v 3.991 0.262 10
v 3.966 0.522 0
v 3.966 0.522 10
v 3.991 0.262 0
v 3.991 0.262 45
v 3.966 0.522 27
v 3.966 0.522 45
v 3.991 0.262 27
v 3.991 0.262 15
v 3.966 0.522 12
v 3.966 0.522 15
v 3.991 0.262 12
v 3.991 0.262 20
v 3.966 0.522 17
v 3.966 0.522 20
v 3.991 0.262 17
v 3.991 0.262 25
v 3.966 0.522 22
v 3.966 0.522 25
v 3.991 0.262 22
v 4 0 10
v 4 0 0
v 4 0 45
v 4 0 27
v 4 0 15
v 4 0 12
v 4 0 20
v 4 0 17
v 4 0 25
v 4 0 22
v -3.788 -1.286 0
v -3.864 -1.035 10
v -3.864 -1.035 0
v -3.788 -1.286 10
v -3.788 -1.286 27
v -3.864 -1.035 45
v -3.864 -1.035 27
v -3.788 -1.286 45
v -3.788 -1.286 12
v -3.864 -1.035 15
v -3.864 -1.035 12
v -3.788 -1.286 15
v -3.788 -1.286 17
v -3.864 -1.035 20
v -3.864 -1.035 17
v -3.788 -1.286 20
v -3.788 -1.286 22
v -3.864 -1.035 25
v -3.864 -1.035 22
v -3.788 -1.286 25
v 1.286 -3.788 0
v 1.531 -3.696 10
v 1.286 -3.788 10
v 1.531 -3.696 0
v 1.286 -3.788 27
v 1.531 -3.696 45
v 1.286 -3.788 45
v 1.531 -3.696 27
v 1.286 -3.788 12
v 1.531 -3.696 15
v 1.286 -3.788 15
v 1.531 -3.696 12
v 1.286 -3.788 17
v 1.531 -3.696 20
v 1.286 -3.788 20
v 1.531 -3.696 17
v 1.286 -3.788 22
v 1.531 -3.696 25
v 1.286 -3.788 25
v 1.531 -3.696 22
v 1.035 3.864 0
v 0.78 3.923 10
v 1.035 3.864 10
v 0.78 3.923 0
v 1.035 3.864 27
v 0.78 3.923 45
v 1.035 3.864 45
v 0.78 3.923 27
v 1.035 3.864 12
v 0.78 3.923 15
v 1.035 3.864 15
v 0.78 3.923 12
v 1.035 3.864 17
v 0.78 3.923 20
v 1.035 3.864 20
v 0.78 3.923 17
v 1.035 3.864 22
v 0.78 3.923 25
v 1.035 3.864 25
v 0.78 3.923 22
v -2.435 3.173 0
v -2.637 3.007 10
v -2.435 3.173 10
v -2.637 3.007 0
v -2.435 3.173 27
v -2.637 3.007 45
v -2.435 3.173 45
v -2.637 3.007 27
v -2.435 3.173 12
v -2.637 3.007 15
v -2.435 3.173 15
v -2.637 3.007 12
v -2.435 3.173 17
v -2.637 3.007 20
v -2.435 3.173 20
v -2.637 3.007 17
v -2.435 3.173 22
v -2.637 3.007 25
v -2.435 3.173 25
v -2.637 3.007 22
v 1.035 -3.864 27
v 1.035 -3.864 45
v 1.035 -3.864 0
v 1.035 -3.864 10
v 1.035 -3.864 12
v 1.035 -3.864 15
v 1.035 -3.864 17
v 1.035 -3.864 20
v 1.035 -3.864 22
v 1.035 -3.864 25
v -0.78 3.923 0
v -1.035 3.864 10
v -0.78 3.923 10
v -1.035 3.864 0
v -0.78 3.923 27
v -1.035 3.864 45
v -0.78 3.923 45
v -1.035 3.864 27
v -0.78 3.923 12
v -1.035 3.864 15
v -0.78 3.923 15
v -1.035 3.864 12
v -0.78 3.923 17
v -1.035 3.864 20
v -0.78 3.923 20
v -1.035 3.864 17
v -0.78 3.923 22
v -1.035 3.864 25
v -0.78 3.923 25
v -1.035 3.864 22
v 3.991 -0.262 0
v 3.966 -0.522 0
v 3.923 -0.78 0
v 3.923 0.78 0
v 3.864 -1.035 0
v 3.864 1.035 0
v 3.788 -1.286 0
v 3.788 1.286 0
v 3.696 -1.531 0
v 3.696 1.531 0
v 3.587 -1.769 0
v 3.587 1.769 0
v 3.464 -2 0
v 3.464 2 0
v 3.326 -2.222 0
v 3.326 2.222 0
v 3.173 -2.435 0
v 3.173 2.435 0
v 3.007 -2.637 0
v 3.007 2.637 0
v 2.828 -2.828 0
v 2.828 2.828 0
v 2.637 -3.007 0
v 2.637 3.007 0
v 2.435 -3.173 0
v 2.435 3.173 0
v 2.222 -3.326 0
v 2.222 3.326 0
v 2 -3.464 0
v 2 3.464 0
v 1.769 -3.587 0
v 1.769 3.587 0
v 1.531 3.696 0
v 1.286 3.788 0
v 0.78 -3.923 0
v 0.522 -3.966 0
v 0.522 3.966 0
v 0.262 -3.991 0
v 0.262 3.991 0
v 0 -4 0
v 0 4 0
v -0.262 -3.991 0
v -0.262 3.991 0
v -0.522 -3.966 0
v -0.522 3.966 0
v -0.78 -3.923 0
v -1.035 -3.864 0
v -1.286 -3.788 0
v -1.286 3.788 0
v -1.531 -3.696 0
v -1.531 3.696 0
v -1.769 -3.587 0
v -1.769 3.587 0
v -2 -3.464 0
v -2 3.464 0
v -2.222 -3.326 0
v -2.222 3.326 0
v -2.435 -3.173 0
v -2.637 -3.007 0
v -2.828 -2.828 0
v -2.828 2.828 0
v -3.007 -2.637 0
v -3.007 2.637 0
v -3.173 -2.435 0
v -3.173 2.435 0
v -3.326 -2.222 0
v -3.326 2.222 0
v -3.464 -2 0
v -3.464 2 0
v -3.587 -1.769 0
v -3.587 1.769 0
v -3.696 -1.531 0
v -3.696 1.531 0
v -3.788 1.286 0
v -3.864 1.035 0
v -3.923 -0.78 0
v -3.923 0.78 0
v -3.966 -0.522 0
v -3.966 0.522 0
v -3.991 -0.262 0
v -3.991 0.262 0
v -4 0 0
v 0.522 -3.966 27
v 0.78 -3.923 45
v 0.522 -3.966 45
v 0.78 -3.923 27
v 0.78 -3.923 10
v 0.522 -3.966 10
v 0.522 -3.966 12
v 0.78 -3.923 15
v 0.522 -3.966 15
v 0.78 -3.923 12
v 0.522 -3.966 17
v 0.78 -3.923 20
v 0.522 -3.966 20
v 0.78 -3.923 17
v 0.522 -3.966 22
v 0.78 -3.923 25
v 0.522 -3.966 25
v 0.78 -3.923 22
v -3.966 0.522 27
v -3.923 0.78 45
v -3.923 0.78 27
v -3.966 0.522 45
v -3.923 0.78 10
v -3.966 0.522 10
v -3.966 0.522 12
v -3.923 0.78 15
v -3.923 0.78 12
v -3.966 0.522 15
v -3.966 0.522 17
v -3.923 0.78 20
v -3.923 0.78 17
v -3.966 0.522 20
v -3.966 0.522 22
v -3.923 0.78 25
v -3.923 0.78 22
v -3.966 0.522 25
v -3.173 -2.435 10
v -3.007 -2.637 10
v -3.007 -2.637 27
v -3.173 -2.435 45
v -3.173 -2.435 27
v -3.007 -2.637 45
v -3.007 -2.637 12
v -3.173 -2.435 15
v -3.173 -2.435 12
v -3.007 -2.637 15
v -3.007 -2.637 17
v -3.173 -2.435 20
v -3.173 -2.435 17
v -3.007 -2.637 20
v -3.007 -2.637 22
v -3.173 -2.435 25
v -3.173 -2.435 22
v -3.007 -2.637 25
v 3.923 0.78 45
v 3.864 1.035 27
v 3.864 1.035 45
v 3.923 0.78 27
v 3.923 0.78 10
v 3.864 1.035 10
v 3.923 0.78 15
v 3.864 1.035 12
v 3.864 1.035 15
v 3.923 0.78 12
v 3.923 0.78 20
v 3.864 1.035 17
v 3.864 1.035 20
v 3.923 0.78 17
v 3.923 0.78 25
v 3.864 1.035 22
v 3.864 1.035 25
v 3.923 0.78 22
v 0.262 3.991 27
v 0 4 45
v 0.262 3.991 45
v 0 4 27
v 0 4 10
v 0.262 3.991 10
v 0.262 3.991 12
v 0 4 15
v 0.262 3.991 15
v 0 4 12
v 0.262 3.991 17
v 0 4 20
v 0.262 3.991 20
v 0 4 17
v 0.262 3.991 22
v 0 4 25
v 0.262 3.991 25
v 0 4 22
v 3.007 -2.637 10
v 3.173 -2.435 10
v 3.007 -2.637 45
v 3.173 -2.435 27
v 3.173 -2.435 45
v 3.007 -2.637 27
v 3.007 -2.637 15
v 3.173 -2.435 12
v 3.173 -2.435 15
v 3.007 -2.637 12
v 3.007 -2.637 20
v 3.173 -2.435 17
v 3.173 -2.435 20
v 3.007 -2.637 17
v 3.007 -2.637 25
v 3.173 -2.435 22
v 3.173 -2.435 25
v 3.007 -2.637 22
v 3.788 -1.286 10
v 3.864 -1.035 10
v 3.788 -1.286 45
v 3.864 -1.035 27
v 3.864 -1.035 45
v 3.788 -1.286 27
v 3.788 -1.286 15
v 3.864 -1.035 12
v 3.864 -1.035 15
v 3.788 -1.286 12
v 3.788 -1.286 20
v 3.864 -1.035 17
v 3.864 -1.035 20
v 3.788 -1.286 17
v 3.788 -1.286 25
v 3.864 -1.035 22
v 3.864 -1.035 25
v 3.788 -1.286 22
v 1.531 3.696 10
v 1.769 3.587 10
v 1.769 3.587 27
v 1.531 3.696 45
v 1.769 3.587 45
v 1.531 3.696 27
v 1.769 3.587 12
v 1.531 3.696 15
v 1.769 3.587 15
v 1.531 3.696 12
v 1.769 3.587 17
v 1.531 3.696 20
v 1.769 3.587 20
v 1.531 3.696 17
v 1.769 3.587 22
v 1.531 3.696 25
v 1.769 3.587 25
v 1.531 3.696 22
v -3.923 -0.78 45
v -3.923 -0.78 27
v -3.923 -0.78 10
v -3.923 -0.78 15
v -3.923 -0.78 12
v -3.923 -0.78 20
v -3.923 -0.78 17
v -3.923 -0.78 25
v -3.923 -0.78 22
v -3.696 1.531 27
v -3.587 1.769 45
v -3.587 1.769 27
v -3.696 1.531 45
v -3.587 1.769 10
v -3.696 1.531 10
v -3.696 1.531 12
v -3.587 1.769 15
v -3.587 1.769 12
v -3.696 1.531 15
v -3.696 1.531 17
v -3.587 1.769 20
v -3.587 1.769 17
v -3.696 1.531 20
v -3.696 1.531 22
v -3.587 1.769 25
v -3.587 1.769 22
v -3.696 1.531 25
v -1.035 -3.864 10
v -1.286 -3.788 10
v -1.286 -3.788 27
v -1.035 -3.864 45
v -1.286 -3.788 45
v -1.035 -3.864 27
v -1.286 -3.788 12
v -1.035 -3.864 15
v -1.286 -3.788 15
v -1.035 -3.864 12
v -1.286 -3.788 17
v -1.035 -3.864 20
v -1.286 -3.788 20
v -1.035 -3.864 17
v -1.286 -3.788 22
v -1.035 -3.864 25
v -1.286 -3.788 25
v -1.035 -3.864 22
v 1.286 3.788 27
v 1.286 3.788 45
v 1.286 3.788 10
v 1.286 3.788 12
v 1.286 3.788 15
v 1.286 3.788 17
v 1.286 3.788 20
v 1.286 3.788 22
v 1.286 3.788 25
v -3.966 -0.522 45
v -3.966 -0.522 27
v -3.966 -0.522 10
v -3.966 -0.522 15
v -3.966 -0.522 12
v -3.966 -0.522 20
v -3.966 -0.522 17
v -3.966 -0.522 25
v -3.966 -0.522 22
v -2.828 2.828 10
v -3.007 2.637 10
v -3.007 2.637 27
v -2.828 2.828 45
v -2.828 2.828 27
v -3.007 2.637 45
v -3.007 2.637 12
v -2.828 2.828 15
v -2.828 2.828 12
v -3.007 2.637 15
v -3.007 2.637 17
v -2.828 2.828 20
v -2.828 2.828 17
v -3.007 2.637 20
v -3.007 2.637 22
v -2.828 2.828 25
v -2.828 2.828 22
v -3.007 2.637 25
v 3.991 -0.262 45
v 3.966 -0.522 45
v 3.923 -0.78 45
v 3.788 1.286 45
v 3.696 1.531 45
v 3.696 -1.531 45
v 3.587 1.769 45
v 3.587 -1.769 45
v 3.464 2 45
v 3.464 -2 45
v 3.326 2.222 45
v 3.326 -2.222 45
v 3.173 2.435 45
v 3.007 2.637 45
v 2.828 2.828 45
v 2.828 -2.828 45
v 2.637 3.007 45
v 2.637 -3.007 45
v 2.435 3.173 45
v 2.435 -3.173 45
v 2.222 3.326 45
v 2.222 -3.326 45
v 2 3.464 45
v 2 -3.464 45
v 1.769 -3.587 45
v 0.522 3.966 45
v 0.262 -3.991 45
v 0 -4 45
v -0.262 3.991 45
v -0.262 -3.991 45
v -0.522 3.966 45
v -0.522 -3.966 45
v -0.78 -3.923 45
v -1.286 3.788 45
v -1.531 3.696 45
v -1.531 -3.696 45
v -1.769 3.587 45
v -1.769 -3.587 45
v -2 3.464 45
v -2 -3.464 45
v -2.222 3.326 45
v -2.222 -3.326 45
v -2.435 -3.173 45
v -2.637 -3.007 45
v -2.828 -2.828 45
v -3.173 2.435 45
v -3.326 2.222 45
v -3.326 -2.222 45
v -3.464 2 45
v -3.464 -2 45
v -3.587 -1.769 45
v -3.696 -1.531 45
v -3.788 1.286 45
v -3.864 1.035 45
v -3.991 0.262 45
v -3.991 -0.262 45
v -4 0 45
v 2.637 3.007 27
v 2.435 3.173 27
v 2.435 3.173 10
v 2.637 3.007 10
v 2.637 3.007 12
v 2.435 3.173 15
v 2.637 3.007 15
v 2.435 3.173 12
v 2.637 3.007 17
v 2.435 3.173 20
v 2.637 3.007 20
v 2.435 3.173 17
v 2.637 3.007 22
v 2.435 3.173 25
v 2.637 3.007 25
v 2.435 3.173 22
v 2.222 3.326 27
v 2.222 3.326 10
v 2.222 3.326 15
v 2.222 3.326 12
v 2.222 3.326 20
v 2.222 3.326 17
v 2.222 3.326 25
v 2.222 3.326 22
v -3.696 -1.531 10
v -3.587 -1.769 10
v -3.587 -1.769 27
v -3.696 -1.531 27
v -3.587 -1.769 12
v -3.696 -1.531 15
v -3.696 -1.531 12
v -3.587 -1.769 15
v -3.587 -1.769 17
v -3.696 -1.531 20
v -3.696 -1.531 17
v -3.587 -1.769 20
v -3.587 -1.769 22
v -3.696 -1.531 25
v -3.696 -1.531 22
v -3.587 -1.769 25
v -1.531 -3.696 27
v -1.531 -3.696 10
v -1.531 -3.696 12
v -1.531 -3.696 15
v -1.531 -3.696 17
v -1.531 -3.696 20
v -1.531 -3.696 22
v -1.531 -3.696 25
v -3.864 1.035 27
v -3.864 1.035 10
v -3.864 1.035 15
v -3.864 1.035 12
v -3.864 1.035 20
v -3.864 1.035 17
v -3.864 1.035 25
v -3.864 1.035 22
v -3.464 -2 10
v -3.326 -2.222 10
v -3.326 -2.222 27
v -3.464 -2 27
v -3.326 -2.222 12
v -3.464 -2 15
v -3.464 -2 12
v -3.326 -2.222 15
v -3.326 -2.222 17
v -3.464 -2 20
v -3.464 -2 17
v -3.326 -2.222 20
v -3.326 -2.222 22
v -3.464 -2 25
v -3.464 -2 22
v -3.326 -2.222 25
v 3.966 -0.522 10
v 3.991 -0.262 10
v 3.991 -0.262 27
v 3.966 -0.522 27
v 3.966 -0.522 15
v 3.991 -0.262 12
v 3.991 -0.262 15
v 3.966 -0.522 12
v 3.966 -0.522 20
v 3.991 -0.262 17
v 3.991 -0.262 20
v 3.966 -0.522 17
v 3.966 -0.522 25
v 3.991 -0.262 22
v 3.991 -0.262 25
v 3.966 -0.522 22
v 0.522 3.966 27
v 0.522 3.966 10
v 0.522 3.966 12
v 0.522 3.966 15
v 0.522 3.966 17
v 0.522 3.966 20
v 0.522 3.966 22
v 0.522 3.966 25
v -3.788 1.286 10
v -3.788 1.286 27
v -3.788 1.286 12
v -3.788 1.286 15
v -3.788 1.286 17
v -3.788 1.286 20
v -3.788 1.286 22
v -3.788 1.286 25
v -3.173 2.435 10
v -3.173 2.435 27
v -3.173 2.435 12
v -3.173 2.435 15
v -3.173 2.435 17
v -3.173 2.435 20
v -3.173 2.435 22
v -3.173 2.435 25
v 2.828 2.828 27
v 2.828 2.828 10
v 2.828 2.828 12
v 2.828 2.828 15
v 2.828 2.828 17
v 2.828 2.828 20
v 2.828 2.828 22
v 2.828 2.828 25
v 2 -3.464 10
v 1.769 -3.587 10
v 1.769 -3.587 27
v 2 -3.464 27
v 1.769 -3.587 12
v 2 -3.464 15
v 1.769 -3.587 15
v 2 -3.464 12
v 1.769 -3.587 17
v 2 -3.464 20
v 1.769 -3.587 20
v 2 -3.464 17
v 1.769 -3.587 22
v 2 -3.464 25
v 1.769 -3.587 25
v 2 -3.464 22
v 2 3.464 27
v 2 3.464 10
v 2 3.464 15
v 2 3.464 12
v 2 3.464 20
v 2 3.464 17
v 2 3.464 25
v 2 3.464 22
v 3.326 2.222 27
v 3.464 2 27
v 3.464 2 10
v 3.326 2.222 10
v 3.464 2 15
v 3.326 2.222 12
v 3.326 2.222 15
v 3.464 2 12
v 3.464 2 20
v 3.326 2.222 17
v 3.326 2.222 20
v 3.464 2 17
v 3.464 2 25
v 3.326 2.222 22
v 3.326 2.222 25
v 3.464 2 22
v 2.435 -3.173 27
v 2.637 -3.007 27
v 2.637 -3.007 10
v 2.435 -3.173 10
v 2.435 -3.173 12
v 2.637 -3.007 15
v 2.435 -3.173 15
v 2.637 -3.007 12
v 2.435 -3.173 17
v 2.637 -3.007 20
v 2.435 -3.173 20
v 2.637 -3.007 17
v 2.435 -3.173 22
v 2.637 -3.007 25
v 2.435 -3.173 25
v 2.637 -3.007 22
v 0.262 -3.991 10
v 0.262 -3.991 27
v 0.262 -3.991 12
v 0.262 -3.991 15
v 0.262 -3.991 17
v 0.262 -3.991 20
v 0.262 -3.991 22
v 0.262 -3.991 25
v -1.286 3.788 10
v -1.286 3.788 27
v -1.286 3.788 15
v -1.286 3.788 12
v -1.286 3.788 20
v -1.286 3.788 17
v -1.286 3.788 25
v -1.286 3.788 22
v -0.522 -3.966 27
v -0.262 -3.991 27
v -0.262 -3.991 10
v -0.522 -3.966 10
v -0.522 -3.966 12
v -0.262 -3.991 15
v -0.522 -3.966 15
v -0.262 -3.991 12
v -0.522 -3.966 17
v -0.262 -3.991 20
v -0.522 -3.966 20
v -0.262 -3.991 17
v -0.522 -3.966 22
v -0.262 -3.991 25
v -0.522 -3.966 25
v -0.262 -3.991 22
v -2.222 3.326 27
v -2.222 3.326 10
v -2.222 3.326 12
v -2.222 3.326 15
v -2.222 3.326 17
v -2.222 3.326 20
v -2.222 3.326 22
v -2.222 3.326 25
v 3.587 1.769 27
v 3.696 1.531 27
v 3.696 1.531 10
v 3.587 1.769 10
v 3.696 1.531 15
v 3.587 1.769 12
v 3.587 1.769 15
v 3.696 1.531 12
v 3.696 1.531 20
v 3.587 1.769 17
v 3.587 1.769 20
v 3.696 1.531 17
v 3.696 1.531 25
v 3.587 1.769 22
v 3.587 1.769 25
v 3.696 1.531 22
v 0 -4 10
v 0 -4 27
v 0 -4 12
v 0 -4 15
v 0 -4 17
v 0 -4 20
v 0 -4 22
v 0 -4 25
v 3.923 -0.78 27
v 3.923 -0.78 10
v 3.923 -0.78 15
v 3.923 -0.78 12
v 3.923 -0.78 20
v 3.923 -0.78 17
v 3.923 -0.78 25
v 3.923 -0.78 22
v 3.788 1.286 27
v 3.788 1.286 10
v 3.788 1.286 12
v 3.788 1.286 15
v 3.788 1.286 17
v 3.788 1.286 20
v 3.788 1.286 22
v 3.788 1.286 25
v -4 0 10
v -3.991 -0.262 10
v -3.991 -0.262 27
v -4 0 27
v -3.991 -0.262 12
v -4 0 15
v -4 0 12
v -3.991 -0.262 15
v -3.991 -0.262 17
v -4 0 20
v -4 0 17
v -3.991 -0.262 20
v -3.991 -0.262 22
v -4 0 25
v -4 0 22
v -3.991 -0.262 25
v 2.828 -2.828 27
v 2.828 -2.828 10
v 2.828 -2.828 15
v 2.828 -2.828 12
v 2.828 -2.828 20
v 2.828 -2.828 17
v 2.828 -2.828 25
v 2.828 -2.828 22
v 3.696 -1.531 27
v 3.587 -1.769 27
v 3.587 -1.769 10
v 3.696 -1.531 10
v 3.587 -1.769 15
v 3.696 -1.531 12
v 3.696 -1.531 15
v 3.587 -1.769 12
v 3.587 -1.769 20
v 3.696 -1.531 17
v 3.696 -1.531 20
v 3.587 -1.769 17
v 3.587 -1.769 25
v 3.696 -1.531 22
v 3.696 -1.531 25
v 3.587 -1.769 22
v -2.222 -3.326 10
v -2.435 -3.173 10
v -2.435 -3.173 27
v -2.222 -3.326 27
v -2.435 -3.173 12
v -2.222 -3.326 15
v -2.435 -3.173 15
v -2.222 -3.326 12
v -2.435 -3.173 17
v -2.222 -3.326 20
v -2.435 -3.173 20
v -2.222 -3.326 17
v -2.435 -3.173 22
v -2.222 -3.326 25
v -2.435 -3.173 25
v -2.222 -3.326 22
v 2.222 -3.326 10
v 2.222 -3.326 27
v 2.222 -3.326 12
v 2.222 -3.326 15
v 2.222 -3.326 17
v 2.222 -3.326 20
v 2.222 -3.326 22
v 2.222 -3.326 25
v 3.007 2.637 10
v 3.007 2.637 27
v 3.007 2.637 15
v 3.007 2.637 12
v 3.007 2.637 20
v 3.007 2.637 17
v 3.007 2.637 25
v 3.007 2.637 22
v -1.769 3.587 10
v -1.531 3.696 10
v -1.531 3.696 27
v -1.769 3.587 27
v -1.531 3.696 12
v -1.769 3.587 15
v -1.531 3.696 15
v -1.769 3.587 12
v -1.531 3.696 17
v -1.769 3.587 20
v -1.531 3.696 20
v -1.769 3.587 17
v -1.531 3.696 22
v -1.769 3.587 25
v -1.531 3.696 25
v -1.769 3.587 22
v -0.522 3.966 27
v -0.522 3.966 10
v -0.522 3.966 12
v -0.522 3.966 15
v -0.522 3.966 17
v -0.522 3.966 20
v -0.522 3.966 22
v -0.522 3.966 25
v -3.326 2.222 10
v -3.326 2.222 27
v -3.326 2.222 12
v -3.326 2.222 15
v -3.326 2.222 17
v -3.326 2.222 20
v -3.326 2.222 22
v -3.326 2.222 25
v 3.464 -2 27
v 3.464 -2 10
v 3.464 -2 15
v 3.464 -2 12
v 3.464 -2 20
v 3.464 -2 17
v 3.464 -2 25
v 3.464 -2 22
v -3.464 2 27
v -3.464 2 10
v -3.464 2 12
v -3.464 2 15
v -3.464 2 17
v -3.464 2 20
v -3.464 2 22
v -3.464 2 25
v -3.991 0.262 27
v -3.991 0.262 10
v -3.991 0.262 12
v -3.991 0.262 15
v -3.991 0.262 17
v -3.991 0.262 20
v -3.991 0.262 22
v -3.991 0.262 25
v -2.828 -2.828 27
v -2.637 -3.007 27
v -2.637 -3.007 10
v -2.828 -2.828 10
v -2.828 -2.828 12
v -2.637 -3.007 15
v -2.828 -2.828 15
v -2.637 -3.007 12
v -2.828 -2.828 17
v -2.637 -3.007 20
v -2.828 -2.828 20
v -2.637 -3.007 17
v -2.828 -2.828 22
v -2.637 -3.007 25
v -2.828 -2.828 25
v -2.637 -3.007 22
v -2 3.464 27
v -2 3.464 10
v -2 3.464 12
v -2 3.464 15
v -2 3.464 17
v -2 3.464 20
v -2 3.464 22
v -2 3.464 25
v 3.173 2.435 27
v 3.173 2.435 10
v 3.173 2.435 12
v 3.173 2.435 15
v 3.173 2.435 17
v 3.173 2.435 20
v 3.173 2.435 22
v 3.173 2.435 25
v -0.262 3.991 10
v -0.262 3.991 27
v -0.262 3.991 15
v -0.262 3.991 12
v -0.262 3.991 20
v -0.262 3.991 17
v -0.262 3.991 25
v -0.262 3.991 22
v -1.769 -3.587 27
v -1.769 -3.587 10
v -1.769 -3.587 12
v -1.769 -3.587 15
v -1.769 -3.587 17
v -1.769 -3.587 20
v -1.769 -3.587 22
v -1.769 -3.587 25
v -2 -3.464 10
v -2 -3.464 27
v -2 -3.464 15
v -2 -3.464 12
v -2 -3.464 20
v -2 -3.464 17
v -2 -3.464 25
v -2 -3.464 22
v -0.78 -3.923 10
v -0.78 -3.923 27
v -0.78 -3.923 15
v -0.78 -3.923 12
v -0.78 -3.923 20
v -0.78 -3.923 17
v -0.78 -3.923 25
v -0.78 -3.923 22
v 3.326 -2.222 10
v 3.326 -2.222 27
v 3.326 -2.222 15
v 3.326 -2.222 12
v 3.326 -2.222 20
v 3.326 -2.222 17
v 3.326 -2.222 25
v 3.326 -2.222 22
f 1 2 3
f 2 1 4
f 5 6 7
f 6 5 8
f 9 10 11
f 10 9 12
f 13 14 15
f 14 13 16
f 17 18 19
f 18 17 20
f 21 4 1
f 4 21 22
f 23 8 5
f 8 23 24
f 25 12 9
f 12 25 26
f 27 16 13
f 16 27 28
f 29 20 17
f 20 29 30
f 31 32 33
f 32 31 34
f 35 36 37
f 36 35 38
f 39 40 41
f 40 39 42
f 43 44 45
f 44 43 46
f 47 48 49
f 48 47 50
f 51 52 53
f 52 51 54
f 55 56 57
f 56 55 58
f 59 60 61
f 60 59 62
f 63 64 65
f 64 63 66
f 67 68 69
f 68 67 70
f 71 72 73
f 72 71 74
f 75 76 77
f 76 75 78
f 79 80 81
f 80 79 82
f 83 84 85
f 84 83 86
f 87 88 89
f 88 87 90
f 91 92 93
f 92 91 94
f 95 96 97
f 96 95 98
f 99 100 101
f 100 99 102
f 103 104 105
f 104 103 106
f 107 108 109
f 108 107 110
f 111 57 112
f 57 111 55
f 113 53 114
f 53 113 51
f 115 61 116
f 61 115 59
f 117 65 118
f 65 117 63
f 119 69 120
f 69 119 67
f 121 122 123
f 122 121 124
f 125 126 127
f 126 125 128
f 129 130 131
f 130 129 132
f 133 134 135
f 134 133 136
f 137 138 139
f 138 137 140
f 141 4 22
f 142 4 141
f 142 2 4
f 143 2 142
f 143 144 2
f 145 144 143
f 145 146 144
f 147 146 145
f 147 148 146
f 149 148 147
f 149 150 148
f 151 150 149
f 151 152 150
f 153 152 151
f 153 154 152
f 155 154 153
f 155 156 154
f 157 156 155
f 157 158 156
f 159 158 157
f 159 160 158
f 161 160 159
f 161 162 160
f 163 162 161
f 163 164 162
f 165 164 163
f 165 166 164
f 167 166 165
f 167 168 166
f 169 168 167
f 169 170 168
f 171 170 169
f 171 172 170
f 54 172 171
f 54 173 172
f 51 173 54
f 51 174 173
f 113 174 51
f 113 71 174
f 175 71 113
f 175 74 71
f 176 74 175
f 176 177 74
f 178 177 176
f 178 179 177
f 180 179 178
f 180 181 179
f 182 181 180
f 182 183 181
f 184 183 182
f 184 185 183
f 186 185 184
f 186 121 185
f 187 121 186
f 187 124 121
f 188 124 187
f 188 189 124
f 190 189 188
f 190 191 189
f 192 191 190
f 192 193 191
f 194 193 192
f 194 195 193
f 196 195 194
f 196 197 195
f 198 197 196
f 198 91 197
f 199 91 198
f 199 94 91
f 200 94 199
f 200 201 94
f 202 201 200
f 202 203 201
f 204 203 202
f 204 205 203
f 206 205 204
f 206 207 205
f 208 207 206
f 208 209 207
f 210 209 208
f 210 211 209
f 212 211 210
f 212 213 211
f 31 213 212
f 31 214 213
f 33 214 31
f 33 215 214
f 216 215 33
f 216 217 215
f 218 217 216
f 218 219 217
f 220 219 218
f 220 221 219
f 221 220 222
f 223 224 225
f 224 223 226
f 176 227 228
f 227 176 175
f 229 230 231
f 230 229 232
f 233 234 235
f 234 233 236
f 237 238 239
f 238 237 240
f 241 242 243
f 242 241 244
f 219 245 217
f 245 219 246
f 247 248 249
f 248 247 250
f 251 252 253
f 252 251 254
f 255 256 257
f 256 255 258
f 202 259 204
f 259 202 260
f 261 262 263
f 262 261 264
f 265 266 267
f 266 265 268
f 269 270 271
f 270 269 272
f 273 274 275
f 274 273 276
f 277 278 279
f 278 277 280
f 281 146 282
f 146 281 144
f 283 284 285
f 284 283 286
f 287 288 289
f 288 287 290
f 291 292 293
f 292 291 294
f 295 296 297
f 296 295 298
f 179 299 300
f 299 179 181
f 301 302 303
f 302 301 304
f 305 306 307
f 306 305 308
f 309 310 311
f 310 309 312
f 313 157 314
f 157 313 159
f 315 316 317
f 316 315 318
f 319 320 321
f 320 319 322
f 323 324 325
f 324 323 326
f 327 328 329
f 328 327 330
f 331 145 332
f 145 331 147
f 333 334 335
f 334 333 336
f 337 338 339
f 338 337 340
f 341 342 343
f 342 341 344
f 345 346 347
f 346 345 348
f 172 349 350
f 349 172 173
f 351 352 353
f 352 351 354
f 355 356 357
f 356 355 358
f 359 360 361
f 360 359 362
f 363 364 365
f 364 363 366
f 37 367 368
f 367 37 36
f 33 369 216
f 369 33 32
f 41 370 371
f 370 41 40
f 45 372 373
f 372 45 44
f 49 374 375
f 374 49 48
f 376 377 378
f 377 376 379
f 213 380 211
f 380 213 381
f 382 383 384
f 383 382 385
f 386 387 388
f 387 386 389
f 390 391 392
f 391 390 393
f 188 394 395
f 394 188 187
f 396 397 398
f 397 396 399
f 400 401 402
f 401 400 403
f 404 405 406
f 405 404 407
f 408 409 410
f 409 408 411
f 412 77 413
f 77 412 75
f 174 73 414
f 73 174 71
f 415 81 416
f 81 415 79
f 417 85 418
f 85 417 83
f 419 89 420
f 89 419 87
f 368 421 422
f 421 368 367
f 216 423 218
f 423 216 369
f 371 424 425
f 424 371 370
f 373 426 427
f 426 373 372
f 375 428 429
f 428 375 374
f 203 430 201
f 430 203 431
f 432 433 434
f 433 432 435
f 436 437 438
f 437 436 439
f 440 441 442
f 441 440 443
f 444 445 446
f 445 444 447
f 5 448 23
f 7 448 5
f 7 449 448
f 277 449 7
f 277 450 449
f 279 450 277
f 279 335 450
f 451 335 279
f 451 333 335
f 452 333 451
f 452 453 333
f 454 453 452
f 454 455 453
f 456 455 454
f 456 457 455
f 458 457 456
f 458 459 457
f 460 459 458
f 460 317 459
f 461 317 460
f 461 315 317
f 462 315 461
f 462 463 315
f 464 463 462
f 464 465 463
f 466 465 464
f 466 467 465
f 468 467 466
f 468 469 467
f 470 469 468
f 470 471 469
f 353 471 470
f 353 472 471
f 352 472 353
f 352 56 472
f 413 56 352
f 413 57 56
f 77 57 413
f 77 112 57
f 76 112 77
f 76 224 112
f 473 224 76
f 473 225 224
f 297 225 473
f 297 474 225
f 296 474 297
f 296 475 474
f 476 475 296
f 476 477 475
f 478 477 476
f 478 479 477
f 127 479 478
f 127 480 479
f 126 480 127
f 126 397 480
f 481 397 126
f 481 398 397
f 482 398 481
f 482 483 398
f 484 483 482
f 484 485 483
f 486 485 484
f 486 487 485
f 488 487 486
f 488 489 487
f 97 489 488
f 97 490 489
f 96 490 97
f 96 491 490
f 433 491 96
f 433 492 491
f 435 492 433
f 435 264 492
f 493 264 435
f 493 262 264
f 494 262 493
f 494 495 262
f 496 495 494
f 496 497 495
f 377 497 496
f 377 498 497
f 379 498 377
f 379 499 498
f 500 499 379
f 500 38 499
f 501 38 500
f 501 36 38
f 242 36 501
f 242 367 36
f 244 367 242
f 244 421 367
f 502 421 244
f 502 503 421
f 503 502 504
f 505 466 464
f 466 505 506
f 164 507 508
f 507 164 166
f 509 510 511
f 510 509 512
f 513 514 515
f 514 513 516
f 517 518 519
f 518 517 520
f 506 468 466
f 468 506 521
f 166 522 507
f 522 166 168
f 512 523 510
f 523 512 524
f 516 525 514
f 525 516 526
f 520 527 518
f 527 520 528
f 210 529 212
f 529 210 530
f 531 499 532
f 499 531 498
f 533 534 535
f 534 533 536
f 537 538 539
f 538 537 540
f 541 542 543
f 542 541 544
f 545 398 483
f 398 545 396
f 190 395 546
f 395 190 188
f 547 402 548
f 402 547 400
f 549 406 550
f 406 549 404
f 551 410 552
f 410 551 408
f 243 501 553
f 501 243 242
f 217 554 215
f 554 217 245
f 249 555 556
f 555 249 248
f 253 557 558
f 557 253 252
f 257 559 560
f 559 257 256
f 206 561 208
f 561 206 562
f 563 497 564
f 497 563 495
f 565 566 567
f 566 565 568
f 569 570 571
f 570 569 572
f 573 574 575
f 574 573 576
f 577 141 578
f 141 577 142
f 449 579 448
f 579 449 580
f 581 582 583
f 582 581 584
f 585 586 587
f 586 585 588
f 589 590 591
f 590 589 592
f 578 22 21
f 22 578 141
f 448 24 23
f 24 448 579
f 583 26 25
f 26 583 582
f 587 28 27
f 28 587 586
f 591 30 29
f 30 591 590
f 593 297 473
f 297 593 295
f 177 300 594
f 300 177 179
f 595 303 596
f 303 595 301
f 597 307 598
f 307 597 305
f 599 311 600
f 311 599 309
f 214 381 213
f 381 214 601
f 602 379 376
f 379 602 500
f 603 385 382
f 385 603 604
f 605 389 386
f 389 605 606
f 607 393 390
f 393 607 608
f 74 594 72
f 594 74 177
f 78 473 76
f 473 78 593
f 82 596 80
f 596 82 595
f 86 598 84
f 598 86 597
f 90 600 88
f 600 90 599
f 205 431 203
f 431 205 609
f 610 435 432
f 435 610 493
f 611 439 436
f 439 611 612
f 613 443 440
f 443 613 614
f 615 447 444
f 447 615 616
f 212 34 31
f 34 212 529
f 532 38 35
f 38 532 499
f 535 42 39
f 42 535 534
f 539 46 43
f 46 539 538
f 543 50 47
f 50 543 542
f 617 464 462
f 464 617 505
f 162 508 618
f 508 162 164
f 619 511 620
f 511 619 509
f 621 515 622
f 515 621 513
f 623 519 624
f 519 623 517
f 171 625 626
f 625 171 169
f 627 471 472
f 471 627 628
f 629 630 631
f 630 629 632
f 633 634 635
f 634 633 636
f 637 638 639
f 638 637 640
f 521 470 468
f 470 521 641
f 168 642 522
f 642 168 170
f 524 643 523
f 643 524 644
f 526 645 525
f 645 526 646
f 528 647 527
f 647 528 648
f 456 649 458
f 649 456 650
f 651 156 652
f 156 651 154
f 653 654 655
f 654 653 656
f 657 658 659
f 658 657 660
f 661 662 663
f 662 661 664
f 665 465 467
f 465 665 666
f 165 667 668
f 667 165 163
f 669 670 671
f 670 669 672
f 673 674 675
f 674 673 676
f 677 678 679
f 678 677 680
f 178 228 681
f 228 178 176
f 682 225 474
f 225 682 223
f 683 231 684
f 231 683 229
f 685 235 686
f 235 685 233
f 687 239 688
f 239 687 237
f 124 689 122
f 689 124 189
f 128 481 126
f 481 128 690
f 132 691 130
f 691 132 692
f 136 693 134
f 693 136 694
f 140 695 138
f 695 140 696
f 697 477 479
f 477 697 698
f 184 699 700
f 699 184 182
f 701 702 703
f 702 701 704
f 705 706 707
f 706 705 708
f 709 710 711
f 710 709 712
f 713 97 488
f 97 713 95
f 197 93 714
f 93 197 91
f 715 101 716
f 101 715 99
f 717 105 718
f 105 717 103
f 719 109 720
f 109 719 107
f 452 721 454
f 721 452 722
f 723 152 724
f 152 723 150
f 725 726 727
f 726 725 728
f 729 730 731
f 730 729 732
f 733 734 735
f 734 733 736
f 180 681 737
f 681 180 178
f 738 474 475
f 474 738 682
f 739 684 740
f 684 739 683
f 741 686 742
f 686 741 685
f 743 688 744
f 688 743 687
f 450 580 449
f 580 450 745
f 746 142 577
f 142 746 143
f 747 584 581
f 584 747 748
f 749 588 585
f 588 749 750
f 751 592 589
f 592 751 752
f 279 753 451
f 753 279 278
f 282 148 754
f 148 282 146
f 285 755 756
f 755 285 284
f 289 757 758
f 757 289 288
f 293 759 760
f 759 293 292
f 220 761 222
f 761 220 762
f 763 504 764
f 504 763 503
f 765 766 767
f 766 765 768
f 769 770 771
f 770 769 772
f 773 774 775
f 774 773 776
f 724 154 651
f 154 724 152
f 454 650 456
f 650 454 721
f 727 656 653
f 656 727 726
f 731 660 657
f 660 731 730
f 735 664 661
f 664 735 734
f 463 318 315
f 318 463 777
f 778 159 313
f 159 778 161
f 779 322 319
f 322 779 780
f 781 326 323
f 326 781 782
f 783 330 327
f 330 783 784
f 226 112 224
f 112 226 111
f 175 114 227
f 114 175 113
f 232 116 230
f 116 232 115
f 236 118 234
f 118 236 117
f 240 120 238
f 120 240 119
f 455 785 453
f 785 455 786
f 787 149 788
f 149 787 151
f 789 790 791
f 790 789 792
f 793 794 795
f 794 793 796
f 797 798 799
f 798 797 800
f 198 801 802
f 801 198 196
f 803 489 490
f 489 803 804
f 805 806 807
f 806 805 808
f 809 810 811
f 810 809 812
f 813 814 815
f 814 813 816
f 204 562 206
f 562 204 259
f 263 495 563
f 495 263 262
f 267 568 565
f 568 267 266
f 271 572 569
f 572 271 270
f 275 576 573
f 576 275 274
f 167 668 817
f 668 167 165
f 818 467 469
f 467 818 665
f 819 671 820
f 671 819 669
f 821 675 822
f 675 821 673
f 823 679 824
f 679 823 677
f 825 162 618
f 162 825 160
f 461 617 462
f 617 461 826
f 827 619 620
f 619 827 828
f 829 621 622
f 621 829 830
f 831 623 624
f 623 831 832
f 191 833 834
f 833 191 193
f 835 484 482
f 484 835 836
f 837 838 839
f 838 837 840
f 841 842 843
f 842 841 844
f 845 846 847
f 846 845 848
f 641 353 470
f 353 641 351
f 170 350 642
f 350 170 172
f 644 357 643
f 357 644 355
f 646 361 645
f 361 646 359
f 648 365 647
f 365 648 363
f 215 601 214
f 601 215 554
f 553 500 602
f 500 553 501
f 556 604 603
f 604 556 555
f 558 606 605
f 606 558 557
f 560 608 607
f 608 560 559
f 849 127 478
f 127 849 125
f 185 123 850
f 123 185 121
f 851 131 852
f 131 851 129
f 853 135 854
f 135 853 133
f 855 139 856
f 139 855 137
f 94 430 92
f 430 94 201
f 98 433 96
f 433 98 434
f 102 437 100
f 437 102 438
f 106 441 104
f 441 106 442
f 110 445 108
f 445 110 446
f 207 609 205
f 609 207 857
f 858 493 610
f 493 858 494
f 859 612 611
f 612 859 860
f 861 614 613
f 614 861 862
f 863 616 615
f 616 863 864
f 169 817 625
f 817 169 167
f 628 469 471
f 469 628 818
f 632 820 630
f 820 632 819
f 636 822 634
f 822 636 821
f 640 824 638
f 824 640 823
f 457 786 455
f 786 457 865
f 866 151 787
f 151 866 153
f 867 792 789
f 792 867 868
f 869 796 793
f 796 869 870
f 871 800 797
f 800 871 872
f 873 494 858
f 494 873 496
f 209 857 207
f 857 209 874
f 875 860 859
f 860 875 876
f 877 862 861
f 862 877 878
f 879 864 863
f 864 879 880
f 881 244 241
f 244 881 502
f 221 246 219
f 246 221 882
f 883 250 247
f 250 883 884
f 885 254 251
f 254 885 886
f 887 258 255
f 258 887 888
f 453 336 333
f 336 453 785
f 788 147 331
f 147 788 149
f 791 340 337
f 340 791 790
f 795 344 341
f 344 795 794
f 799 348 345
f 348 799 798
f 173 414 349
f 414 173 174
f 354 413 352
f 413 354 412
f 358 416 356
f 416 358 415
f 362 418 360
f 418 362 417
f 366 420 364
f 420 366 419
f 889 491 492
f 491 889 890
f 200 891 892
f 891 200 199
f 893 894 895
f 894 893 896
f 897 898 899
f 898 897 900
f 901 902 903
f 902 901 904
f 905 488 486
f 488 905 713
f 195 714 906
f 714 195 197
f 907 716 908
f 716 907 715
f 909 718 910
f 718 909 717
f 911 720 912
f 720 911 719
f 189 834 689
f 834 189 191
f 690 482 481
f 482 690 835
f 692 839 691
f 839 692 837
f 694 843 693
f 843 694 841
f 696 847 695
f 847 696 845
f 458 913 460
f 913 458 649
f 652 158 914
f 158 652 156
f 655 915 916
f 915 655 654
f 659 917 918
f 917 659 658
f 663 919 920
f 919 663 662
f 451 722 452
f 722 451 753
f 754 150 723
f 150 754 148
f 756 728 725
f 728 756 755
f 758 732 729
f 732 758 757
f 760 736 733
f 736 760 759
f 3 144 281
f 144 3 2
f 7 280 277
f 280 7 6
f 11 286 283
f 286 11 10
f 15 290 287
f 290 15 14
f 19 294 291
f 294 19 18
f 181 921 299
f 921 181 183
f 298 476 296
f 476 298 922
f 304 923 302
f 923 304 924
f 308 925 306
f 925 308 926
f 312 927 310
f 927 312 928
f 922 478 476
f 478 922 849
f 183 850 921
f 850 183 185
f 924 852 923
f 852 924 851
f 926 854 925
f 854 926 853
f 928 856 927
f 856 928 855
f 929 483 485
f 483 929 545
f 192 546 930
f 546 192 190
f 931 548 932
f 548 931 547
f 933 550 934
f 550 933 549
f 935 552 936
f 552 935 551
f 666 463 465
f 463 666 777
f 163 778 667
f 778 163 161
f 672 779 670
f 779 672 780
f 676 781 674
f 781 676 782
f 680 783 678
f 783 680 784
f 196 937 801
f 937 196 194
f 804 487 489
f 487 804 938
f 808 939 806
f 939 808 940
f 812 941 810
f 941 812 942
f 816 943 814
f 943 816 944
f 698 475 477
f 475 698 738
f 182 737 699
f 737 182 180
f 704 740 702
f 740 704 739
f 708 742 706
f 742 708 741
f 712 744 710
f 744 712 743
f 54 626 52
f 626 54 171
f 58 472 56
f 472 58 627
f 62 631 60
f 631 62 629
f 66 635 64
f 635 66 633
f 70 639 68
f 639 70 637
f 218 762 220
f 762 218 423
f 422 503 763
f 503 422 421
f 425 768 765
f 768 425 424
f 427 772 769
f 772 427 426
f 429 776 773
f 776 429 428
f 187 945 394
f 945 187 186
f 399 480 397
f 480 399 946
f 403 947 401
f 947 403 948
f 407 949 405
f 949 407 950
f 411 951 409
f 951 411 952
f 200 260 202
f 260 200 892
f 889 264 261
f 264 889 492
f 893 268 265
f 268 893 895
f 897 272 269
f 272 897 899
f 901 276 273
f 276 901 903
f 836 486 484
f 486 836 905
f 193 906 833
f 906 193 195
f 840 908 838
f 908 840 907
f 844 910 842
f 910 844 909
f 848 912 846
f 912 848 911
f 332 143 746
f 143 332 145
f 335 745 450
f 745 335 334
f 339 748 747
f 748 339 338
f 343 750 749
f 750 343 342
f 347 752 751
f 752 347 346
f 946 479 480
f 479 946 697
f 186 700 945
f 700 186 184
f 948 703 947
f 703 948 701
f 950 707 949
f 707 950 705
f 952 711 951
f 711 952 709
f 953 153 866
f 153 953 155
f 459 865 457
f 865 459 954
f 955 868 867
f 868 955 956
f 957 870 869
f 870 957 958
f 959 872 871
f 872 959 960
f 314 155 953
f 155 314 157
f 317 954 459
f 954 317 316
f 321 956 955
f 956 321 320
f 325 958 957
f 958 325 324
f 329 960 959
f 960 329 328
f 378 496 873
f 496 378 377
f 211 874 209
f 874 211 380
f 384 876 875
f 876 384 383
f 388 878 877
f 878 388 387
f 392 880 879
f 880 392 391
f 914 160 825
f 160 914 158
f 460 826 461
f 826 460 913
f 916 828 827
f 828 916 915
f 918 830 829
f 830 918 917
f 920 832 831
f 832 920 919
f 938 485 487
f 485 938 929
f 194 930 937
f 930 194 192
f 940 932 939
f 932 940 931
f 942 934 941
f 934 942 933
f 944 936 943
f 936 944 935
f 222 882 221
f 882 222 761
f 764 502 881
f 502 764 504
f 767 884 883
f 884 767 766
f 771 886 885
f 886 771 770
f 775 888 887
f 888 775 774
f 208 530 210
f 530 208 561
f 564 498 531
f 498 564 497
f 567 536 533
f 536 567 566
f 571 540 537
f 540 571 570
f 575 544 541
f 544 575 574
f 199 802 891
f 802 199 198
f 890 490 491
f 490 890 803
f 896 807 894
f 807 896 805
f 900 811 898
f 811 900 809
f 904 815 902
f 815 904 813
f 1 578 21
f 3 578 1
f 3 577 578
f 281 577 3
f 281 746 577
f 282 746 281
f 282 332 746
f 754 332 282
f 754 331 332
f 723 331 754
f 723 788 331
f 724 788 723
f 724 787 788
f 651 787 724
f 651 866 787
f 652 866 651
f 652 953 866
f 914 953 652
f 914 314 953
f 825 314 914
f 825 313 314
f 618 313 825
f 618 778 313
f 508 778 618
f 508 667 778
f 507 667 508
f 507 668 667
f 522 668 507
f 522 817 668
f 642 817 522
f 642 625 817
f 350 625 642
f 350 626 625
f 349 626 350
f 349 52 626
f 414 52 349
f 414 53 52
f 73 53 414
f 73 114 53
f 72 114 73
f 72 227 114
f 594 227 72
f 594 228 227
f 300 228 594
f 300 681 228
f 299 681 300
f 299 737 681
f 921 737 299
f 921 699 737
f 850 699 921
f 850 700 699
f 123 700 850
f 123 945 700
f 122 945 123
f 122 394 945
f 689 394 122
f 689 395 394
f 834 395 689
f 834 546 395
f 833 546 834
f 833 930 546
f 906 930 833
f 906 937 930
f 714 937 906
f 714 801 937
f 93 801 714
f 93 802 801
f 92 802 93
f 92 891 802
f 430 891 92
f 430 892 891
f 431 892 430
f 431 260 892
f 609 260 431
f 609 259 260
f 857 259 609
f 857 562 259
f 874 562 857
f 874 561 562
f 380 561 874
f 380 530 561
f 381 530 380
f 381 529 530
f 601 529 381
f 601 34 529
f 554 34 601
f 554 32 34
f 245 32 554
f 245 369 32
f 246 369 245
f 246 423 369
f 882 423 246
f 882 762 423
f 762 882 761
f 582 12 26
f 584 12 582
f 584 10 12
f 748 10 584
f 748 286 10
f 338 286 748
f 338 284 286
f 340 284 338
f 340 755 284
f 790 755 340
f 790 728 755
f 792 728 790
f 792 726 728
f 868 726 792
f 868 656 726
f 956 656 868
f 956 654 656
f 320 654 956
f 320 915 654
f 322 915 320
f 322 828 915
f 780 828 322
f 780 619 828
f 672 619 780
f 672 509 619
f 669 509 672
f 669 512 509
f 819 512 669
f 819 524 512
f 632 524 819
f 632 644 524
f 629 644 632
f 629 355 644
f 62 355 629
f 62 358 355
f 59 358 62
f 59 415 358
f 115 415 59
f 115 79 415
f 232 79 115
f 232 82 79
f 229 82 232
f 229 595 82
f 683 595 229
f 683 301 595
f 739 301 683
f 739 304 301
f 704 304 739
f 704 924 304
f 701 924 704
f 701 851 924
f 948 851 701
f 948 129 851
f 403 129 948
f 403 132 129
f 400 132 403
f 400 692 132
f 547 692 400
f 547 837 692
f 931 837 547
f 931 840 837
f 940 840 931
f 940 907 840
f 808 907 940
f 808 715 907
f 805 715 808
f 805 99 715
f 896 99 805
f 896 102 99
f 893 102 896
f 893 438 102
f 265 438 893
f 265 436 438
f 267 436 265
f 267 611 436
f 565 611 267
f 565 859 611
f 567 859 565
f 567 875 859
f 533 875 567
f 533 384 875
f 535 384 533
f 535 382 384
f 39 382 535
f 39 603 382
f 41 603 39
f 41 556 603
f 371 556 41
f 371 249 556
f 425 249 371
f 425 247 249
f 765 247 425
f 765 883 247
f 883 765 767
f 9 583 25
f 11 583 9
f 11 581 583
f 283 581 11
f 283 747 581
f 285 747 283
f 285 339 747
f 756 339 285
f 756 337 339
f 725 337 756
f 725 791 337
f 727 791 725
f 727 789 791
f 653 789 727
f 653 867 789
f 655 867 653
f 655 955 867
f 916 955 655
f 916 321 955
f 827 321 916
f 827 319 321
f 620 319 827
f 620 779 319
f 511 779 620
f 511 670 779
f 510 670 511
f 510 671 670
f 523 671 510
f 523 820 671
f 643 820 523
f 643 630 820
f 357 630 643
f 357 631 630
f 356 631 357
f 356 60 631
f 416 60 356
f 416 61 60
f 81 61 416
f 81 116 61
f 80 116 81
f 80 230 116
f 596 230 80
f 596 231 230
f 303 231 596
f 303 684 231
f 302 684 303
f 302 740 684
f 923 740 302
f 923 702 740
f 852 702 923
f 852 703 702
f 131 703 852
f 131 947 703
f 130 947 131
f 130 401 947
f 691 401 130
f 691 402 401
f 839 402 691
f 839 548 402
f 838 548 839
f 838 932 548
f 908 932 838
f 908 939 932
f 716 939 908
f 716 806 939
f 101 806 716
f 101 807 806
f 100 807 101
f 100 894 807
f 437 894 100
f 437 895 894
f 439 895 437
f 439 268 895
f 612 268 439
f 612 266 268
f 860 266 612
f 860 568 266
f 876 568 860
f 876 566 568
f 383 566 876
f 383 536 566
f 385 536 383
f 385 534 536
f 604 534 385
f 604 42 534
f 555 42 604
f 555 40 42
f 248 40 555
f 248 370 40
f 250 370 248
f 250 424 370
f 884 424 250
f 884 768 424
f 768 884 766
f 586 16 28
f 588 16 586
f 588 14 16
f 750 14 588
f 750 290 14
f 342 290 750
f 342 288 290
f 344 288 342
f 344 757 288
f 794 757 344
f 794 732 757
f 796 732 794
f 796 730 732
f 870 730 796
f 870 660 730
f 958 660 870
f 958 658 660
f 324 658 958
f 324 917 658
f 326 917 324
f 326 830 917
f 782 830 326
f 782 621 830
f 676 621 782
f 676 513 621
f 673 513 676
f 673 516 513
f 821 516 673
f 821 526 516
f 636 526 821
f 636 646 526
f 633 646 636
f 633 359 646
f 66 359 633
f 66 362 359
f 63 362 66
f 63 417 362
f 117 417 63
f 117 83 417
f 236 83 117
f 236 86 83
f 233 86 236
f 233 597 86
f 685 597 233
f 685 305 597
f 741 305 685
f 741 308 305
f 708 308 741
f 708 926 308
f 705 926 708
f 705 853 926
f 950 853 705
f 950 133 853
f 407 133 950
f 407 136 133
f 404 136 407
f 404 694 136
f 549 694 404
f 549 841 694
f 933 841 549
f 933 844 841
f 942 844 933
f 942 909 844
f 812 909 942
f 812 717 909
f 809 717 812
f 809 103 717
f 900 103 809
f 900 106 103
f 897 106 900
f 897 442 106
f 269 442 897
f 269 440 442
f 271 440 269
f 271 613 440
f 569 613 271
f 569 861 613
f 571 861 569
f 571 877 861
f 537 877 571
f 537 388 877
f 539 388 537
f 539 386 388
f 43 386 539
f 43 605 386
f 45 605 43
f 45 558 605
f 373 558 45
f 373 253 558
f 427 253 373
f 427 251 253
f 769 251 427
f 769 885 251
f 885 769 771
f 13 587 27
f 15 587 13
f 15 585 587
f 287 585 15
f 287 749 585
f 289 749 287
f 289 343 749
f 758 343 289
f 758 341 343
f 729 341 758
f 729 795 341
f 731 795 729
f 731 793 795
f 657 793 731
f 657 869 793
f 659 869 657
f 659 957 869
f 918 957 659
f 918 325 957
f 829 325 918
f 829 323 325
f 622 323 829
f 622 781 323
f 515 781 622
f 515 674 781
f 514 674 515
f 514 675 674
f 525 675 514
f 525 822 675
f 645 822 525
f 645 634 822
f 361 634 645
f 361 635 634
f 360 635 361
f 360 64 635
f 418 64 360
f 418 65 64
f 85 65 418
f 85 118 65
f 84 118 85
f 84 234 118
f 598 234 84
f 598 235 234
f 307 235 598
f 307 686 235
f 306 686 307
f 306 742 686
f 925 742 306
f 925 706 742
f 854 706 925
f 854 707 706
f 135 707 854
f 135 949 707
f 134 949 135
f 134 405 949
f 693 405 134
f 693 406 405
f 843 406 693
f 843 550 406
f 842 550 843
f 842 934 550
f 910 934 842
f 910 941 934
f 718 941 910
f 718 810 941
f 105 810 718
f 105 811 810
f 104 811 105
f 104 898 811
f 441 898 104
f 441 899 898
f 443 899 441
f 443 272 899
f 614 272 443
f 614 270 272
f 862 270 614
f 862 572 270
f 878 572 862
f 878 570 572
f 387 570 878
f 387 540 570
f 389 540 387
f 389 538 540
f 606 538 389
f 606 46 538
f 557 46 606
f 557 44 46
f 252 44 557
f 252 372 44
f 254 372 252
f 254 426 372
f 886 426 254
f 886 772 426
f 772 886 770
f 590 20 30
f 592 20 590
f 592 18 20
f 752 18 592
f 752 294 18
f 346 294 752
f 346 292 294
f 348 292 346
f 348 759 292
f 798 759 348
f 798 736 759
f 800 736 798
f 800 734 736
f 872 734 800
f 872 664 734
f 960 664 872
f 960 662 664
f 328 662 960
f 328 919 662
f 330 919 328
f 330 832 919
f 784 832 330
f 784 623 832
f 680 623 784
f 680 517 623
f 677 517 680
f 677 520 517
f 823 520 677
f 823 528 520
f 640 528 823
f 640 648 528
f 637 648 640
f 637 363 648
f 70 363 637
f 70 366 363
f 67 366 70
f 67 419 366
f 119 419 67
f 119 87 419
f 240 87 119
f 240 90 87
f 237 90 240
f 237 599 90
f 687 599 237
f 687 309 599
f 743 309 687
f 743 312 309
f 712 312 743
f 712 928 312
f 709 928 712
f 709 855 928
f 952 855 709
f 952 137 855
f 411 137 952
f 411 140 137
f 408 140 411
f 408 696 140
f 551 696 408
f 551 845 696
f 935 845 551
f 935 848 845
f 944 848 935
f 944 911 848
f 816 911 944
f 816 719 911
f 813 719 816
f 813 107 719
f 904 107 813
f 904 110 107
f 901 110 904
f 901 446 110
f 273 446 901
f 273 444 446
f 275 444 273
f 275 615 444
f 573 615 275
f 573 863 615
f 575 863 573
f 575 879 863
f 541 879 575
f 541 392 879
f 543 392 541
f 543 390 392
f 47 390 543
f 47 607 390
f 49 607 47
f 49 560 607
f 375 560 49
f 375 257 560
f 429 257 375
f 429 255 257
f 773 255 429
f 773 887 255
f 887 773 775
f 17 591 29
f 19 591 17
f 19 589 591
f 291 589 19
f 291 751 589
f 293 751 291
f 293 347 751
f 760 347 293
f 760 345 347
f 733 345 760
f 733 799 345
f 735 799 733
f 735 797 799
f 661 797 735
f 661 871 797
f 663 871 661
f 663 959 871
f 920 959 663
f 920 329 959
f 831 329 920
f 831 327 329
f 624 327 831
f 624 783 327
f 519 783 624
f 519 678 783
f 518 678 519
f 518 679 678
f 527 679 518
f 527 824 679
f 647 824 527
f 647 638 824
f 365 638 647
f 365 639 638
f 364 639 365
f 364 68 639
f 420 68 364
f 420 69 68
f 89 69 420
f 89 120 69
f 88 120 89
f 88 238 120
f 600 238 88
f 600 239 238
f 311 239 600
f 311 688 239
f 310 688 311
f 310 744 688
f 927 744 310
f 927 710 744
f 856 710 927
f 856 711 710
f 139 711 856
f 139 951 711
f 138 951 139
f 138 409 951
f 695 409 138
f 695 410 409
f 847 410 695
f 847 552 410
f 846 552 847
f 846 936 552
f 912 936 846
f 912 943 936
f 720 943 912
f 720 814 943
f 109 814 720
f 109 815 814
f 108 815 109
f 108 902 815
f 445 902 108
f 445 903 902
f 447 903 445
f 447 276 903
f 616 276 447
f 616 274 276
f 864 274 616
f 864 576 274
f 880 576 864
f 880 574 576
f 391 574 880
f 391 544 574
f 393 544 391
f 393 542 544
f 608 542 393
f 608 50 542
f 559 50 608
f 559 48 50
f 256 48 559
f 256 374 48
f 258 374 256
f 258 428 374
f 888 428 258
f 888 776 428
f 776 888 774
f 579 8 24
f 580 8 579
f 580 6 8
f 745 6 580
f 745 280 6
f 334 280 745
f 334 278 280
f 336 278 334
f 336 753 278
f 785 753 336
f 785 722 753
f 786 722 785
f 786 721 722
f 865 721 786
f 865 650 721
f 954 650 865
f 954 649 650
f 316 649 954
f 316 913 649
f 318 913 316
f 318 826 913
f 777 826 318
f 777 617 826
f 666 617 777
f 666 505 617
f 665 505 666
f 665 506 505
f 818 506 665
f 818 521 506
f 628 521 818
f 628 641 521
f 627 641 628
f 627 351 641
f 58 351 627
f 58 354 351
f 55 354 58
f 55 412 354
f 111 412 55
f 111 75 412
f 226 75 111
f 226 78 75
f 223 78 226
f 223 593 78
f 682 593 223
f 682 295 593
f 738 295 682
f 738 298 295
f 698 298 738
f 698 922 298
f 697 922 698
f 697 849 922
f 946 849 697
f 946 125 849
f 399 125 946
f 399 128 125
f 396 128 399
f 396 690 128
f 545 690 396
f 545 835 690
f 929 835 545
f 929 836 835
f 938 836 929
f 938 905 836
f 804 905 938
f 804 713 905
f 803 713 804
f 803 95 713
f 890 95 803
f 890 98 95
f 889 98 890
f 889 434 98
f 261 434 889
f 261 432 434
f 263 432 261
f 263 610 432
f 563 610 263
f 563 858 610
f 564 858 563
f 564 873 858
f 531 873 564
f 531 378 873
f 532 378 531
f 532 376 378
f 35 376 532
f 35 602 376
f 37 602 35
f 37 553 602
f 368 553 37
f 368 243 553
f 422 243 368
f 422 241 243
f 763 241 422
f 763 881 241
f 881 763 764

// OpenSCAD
// Tissue-pestle for 1.5 mL microcentrifuge tube
// Print orientation: standing upright, handle on the bed

// ---- Dimensions (mm) ----
handle_d      = 8;     // handle diameter
handle_h      = 45;    // handle height (z = 0 to 45)
cone_top_d    = 8;     // cone diameter at top of handle (z = 45)
cone_tip_d    = 3;     // cone diameter at tip (z = 62)
tip_r         = 1.5;   // rounded tip radius (sphere centred at z = 62)
groove_w      = 2;     // groove width (Z)
groove_depth  = 1;     // groove depth from handle surface
groove_z      = [10, 15, 20, 25]; // groove centre heights

eps           = 0.5;   // cutter overshoot past faces
$fn           = 96;    // curve resolution

// ---- Model ----
difference() {
    union() {
        // Handle
        cylinder(d = handle_d, h = handle_h);
        // Tapering cone (z = 45 to 62)
        translate([0, 0, handle_h])
            cylinder(d1 = cone_top_d, d2 = cone_tip_d, h = cone_tip_d - cone_top_d + eps);
        // Rounded tip
        translate([0, 0, handle_h + cone_tip_d - cone_top_d])
            sphere(r = tip_r);
    }
    // Grip grooves
    for (z = groove_z)
        translate([0, 0, z])
            cylinder(d = handle_d + 2 * eps, h = groove_w, depth = groove_depth, $fn = 64);
}
